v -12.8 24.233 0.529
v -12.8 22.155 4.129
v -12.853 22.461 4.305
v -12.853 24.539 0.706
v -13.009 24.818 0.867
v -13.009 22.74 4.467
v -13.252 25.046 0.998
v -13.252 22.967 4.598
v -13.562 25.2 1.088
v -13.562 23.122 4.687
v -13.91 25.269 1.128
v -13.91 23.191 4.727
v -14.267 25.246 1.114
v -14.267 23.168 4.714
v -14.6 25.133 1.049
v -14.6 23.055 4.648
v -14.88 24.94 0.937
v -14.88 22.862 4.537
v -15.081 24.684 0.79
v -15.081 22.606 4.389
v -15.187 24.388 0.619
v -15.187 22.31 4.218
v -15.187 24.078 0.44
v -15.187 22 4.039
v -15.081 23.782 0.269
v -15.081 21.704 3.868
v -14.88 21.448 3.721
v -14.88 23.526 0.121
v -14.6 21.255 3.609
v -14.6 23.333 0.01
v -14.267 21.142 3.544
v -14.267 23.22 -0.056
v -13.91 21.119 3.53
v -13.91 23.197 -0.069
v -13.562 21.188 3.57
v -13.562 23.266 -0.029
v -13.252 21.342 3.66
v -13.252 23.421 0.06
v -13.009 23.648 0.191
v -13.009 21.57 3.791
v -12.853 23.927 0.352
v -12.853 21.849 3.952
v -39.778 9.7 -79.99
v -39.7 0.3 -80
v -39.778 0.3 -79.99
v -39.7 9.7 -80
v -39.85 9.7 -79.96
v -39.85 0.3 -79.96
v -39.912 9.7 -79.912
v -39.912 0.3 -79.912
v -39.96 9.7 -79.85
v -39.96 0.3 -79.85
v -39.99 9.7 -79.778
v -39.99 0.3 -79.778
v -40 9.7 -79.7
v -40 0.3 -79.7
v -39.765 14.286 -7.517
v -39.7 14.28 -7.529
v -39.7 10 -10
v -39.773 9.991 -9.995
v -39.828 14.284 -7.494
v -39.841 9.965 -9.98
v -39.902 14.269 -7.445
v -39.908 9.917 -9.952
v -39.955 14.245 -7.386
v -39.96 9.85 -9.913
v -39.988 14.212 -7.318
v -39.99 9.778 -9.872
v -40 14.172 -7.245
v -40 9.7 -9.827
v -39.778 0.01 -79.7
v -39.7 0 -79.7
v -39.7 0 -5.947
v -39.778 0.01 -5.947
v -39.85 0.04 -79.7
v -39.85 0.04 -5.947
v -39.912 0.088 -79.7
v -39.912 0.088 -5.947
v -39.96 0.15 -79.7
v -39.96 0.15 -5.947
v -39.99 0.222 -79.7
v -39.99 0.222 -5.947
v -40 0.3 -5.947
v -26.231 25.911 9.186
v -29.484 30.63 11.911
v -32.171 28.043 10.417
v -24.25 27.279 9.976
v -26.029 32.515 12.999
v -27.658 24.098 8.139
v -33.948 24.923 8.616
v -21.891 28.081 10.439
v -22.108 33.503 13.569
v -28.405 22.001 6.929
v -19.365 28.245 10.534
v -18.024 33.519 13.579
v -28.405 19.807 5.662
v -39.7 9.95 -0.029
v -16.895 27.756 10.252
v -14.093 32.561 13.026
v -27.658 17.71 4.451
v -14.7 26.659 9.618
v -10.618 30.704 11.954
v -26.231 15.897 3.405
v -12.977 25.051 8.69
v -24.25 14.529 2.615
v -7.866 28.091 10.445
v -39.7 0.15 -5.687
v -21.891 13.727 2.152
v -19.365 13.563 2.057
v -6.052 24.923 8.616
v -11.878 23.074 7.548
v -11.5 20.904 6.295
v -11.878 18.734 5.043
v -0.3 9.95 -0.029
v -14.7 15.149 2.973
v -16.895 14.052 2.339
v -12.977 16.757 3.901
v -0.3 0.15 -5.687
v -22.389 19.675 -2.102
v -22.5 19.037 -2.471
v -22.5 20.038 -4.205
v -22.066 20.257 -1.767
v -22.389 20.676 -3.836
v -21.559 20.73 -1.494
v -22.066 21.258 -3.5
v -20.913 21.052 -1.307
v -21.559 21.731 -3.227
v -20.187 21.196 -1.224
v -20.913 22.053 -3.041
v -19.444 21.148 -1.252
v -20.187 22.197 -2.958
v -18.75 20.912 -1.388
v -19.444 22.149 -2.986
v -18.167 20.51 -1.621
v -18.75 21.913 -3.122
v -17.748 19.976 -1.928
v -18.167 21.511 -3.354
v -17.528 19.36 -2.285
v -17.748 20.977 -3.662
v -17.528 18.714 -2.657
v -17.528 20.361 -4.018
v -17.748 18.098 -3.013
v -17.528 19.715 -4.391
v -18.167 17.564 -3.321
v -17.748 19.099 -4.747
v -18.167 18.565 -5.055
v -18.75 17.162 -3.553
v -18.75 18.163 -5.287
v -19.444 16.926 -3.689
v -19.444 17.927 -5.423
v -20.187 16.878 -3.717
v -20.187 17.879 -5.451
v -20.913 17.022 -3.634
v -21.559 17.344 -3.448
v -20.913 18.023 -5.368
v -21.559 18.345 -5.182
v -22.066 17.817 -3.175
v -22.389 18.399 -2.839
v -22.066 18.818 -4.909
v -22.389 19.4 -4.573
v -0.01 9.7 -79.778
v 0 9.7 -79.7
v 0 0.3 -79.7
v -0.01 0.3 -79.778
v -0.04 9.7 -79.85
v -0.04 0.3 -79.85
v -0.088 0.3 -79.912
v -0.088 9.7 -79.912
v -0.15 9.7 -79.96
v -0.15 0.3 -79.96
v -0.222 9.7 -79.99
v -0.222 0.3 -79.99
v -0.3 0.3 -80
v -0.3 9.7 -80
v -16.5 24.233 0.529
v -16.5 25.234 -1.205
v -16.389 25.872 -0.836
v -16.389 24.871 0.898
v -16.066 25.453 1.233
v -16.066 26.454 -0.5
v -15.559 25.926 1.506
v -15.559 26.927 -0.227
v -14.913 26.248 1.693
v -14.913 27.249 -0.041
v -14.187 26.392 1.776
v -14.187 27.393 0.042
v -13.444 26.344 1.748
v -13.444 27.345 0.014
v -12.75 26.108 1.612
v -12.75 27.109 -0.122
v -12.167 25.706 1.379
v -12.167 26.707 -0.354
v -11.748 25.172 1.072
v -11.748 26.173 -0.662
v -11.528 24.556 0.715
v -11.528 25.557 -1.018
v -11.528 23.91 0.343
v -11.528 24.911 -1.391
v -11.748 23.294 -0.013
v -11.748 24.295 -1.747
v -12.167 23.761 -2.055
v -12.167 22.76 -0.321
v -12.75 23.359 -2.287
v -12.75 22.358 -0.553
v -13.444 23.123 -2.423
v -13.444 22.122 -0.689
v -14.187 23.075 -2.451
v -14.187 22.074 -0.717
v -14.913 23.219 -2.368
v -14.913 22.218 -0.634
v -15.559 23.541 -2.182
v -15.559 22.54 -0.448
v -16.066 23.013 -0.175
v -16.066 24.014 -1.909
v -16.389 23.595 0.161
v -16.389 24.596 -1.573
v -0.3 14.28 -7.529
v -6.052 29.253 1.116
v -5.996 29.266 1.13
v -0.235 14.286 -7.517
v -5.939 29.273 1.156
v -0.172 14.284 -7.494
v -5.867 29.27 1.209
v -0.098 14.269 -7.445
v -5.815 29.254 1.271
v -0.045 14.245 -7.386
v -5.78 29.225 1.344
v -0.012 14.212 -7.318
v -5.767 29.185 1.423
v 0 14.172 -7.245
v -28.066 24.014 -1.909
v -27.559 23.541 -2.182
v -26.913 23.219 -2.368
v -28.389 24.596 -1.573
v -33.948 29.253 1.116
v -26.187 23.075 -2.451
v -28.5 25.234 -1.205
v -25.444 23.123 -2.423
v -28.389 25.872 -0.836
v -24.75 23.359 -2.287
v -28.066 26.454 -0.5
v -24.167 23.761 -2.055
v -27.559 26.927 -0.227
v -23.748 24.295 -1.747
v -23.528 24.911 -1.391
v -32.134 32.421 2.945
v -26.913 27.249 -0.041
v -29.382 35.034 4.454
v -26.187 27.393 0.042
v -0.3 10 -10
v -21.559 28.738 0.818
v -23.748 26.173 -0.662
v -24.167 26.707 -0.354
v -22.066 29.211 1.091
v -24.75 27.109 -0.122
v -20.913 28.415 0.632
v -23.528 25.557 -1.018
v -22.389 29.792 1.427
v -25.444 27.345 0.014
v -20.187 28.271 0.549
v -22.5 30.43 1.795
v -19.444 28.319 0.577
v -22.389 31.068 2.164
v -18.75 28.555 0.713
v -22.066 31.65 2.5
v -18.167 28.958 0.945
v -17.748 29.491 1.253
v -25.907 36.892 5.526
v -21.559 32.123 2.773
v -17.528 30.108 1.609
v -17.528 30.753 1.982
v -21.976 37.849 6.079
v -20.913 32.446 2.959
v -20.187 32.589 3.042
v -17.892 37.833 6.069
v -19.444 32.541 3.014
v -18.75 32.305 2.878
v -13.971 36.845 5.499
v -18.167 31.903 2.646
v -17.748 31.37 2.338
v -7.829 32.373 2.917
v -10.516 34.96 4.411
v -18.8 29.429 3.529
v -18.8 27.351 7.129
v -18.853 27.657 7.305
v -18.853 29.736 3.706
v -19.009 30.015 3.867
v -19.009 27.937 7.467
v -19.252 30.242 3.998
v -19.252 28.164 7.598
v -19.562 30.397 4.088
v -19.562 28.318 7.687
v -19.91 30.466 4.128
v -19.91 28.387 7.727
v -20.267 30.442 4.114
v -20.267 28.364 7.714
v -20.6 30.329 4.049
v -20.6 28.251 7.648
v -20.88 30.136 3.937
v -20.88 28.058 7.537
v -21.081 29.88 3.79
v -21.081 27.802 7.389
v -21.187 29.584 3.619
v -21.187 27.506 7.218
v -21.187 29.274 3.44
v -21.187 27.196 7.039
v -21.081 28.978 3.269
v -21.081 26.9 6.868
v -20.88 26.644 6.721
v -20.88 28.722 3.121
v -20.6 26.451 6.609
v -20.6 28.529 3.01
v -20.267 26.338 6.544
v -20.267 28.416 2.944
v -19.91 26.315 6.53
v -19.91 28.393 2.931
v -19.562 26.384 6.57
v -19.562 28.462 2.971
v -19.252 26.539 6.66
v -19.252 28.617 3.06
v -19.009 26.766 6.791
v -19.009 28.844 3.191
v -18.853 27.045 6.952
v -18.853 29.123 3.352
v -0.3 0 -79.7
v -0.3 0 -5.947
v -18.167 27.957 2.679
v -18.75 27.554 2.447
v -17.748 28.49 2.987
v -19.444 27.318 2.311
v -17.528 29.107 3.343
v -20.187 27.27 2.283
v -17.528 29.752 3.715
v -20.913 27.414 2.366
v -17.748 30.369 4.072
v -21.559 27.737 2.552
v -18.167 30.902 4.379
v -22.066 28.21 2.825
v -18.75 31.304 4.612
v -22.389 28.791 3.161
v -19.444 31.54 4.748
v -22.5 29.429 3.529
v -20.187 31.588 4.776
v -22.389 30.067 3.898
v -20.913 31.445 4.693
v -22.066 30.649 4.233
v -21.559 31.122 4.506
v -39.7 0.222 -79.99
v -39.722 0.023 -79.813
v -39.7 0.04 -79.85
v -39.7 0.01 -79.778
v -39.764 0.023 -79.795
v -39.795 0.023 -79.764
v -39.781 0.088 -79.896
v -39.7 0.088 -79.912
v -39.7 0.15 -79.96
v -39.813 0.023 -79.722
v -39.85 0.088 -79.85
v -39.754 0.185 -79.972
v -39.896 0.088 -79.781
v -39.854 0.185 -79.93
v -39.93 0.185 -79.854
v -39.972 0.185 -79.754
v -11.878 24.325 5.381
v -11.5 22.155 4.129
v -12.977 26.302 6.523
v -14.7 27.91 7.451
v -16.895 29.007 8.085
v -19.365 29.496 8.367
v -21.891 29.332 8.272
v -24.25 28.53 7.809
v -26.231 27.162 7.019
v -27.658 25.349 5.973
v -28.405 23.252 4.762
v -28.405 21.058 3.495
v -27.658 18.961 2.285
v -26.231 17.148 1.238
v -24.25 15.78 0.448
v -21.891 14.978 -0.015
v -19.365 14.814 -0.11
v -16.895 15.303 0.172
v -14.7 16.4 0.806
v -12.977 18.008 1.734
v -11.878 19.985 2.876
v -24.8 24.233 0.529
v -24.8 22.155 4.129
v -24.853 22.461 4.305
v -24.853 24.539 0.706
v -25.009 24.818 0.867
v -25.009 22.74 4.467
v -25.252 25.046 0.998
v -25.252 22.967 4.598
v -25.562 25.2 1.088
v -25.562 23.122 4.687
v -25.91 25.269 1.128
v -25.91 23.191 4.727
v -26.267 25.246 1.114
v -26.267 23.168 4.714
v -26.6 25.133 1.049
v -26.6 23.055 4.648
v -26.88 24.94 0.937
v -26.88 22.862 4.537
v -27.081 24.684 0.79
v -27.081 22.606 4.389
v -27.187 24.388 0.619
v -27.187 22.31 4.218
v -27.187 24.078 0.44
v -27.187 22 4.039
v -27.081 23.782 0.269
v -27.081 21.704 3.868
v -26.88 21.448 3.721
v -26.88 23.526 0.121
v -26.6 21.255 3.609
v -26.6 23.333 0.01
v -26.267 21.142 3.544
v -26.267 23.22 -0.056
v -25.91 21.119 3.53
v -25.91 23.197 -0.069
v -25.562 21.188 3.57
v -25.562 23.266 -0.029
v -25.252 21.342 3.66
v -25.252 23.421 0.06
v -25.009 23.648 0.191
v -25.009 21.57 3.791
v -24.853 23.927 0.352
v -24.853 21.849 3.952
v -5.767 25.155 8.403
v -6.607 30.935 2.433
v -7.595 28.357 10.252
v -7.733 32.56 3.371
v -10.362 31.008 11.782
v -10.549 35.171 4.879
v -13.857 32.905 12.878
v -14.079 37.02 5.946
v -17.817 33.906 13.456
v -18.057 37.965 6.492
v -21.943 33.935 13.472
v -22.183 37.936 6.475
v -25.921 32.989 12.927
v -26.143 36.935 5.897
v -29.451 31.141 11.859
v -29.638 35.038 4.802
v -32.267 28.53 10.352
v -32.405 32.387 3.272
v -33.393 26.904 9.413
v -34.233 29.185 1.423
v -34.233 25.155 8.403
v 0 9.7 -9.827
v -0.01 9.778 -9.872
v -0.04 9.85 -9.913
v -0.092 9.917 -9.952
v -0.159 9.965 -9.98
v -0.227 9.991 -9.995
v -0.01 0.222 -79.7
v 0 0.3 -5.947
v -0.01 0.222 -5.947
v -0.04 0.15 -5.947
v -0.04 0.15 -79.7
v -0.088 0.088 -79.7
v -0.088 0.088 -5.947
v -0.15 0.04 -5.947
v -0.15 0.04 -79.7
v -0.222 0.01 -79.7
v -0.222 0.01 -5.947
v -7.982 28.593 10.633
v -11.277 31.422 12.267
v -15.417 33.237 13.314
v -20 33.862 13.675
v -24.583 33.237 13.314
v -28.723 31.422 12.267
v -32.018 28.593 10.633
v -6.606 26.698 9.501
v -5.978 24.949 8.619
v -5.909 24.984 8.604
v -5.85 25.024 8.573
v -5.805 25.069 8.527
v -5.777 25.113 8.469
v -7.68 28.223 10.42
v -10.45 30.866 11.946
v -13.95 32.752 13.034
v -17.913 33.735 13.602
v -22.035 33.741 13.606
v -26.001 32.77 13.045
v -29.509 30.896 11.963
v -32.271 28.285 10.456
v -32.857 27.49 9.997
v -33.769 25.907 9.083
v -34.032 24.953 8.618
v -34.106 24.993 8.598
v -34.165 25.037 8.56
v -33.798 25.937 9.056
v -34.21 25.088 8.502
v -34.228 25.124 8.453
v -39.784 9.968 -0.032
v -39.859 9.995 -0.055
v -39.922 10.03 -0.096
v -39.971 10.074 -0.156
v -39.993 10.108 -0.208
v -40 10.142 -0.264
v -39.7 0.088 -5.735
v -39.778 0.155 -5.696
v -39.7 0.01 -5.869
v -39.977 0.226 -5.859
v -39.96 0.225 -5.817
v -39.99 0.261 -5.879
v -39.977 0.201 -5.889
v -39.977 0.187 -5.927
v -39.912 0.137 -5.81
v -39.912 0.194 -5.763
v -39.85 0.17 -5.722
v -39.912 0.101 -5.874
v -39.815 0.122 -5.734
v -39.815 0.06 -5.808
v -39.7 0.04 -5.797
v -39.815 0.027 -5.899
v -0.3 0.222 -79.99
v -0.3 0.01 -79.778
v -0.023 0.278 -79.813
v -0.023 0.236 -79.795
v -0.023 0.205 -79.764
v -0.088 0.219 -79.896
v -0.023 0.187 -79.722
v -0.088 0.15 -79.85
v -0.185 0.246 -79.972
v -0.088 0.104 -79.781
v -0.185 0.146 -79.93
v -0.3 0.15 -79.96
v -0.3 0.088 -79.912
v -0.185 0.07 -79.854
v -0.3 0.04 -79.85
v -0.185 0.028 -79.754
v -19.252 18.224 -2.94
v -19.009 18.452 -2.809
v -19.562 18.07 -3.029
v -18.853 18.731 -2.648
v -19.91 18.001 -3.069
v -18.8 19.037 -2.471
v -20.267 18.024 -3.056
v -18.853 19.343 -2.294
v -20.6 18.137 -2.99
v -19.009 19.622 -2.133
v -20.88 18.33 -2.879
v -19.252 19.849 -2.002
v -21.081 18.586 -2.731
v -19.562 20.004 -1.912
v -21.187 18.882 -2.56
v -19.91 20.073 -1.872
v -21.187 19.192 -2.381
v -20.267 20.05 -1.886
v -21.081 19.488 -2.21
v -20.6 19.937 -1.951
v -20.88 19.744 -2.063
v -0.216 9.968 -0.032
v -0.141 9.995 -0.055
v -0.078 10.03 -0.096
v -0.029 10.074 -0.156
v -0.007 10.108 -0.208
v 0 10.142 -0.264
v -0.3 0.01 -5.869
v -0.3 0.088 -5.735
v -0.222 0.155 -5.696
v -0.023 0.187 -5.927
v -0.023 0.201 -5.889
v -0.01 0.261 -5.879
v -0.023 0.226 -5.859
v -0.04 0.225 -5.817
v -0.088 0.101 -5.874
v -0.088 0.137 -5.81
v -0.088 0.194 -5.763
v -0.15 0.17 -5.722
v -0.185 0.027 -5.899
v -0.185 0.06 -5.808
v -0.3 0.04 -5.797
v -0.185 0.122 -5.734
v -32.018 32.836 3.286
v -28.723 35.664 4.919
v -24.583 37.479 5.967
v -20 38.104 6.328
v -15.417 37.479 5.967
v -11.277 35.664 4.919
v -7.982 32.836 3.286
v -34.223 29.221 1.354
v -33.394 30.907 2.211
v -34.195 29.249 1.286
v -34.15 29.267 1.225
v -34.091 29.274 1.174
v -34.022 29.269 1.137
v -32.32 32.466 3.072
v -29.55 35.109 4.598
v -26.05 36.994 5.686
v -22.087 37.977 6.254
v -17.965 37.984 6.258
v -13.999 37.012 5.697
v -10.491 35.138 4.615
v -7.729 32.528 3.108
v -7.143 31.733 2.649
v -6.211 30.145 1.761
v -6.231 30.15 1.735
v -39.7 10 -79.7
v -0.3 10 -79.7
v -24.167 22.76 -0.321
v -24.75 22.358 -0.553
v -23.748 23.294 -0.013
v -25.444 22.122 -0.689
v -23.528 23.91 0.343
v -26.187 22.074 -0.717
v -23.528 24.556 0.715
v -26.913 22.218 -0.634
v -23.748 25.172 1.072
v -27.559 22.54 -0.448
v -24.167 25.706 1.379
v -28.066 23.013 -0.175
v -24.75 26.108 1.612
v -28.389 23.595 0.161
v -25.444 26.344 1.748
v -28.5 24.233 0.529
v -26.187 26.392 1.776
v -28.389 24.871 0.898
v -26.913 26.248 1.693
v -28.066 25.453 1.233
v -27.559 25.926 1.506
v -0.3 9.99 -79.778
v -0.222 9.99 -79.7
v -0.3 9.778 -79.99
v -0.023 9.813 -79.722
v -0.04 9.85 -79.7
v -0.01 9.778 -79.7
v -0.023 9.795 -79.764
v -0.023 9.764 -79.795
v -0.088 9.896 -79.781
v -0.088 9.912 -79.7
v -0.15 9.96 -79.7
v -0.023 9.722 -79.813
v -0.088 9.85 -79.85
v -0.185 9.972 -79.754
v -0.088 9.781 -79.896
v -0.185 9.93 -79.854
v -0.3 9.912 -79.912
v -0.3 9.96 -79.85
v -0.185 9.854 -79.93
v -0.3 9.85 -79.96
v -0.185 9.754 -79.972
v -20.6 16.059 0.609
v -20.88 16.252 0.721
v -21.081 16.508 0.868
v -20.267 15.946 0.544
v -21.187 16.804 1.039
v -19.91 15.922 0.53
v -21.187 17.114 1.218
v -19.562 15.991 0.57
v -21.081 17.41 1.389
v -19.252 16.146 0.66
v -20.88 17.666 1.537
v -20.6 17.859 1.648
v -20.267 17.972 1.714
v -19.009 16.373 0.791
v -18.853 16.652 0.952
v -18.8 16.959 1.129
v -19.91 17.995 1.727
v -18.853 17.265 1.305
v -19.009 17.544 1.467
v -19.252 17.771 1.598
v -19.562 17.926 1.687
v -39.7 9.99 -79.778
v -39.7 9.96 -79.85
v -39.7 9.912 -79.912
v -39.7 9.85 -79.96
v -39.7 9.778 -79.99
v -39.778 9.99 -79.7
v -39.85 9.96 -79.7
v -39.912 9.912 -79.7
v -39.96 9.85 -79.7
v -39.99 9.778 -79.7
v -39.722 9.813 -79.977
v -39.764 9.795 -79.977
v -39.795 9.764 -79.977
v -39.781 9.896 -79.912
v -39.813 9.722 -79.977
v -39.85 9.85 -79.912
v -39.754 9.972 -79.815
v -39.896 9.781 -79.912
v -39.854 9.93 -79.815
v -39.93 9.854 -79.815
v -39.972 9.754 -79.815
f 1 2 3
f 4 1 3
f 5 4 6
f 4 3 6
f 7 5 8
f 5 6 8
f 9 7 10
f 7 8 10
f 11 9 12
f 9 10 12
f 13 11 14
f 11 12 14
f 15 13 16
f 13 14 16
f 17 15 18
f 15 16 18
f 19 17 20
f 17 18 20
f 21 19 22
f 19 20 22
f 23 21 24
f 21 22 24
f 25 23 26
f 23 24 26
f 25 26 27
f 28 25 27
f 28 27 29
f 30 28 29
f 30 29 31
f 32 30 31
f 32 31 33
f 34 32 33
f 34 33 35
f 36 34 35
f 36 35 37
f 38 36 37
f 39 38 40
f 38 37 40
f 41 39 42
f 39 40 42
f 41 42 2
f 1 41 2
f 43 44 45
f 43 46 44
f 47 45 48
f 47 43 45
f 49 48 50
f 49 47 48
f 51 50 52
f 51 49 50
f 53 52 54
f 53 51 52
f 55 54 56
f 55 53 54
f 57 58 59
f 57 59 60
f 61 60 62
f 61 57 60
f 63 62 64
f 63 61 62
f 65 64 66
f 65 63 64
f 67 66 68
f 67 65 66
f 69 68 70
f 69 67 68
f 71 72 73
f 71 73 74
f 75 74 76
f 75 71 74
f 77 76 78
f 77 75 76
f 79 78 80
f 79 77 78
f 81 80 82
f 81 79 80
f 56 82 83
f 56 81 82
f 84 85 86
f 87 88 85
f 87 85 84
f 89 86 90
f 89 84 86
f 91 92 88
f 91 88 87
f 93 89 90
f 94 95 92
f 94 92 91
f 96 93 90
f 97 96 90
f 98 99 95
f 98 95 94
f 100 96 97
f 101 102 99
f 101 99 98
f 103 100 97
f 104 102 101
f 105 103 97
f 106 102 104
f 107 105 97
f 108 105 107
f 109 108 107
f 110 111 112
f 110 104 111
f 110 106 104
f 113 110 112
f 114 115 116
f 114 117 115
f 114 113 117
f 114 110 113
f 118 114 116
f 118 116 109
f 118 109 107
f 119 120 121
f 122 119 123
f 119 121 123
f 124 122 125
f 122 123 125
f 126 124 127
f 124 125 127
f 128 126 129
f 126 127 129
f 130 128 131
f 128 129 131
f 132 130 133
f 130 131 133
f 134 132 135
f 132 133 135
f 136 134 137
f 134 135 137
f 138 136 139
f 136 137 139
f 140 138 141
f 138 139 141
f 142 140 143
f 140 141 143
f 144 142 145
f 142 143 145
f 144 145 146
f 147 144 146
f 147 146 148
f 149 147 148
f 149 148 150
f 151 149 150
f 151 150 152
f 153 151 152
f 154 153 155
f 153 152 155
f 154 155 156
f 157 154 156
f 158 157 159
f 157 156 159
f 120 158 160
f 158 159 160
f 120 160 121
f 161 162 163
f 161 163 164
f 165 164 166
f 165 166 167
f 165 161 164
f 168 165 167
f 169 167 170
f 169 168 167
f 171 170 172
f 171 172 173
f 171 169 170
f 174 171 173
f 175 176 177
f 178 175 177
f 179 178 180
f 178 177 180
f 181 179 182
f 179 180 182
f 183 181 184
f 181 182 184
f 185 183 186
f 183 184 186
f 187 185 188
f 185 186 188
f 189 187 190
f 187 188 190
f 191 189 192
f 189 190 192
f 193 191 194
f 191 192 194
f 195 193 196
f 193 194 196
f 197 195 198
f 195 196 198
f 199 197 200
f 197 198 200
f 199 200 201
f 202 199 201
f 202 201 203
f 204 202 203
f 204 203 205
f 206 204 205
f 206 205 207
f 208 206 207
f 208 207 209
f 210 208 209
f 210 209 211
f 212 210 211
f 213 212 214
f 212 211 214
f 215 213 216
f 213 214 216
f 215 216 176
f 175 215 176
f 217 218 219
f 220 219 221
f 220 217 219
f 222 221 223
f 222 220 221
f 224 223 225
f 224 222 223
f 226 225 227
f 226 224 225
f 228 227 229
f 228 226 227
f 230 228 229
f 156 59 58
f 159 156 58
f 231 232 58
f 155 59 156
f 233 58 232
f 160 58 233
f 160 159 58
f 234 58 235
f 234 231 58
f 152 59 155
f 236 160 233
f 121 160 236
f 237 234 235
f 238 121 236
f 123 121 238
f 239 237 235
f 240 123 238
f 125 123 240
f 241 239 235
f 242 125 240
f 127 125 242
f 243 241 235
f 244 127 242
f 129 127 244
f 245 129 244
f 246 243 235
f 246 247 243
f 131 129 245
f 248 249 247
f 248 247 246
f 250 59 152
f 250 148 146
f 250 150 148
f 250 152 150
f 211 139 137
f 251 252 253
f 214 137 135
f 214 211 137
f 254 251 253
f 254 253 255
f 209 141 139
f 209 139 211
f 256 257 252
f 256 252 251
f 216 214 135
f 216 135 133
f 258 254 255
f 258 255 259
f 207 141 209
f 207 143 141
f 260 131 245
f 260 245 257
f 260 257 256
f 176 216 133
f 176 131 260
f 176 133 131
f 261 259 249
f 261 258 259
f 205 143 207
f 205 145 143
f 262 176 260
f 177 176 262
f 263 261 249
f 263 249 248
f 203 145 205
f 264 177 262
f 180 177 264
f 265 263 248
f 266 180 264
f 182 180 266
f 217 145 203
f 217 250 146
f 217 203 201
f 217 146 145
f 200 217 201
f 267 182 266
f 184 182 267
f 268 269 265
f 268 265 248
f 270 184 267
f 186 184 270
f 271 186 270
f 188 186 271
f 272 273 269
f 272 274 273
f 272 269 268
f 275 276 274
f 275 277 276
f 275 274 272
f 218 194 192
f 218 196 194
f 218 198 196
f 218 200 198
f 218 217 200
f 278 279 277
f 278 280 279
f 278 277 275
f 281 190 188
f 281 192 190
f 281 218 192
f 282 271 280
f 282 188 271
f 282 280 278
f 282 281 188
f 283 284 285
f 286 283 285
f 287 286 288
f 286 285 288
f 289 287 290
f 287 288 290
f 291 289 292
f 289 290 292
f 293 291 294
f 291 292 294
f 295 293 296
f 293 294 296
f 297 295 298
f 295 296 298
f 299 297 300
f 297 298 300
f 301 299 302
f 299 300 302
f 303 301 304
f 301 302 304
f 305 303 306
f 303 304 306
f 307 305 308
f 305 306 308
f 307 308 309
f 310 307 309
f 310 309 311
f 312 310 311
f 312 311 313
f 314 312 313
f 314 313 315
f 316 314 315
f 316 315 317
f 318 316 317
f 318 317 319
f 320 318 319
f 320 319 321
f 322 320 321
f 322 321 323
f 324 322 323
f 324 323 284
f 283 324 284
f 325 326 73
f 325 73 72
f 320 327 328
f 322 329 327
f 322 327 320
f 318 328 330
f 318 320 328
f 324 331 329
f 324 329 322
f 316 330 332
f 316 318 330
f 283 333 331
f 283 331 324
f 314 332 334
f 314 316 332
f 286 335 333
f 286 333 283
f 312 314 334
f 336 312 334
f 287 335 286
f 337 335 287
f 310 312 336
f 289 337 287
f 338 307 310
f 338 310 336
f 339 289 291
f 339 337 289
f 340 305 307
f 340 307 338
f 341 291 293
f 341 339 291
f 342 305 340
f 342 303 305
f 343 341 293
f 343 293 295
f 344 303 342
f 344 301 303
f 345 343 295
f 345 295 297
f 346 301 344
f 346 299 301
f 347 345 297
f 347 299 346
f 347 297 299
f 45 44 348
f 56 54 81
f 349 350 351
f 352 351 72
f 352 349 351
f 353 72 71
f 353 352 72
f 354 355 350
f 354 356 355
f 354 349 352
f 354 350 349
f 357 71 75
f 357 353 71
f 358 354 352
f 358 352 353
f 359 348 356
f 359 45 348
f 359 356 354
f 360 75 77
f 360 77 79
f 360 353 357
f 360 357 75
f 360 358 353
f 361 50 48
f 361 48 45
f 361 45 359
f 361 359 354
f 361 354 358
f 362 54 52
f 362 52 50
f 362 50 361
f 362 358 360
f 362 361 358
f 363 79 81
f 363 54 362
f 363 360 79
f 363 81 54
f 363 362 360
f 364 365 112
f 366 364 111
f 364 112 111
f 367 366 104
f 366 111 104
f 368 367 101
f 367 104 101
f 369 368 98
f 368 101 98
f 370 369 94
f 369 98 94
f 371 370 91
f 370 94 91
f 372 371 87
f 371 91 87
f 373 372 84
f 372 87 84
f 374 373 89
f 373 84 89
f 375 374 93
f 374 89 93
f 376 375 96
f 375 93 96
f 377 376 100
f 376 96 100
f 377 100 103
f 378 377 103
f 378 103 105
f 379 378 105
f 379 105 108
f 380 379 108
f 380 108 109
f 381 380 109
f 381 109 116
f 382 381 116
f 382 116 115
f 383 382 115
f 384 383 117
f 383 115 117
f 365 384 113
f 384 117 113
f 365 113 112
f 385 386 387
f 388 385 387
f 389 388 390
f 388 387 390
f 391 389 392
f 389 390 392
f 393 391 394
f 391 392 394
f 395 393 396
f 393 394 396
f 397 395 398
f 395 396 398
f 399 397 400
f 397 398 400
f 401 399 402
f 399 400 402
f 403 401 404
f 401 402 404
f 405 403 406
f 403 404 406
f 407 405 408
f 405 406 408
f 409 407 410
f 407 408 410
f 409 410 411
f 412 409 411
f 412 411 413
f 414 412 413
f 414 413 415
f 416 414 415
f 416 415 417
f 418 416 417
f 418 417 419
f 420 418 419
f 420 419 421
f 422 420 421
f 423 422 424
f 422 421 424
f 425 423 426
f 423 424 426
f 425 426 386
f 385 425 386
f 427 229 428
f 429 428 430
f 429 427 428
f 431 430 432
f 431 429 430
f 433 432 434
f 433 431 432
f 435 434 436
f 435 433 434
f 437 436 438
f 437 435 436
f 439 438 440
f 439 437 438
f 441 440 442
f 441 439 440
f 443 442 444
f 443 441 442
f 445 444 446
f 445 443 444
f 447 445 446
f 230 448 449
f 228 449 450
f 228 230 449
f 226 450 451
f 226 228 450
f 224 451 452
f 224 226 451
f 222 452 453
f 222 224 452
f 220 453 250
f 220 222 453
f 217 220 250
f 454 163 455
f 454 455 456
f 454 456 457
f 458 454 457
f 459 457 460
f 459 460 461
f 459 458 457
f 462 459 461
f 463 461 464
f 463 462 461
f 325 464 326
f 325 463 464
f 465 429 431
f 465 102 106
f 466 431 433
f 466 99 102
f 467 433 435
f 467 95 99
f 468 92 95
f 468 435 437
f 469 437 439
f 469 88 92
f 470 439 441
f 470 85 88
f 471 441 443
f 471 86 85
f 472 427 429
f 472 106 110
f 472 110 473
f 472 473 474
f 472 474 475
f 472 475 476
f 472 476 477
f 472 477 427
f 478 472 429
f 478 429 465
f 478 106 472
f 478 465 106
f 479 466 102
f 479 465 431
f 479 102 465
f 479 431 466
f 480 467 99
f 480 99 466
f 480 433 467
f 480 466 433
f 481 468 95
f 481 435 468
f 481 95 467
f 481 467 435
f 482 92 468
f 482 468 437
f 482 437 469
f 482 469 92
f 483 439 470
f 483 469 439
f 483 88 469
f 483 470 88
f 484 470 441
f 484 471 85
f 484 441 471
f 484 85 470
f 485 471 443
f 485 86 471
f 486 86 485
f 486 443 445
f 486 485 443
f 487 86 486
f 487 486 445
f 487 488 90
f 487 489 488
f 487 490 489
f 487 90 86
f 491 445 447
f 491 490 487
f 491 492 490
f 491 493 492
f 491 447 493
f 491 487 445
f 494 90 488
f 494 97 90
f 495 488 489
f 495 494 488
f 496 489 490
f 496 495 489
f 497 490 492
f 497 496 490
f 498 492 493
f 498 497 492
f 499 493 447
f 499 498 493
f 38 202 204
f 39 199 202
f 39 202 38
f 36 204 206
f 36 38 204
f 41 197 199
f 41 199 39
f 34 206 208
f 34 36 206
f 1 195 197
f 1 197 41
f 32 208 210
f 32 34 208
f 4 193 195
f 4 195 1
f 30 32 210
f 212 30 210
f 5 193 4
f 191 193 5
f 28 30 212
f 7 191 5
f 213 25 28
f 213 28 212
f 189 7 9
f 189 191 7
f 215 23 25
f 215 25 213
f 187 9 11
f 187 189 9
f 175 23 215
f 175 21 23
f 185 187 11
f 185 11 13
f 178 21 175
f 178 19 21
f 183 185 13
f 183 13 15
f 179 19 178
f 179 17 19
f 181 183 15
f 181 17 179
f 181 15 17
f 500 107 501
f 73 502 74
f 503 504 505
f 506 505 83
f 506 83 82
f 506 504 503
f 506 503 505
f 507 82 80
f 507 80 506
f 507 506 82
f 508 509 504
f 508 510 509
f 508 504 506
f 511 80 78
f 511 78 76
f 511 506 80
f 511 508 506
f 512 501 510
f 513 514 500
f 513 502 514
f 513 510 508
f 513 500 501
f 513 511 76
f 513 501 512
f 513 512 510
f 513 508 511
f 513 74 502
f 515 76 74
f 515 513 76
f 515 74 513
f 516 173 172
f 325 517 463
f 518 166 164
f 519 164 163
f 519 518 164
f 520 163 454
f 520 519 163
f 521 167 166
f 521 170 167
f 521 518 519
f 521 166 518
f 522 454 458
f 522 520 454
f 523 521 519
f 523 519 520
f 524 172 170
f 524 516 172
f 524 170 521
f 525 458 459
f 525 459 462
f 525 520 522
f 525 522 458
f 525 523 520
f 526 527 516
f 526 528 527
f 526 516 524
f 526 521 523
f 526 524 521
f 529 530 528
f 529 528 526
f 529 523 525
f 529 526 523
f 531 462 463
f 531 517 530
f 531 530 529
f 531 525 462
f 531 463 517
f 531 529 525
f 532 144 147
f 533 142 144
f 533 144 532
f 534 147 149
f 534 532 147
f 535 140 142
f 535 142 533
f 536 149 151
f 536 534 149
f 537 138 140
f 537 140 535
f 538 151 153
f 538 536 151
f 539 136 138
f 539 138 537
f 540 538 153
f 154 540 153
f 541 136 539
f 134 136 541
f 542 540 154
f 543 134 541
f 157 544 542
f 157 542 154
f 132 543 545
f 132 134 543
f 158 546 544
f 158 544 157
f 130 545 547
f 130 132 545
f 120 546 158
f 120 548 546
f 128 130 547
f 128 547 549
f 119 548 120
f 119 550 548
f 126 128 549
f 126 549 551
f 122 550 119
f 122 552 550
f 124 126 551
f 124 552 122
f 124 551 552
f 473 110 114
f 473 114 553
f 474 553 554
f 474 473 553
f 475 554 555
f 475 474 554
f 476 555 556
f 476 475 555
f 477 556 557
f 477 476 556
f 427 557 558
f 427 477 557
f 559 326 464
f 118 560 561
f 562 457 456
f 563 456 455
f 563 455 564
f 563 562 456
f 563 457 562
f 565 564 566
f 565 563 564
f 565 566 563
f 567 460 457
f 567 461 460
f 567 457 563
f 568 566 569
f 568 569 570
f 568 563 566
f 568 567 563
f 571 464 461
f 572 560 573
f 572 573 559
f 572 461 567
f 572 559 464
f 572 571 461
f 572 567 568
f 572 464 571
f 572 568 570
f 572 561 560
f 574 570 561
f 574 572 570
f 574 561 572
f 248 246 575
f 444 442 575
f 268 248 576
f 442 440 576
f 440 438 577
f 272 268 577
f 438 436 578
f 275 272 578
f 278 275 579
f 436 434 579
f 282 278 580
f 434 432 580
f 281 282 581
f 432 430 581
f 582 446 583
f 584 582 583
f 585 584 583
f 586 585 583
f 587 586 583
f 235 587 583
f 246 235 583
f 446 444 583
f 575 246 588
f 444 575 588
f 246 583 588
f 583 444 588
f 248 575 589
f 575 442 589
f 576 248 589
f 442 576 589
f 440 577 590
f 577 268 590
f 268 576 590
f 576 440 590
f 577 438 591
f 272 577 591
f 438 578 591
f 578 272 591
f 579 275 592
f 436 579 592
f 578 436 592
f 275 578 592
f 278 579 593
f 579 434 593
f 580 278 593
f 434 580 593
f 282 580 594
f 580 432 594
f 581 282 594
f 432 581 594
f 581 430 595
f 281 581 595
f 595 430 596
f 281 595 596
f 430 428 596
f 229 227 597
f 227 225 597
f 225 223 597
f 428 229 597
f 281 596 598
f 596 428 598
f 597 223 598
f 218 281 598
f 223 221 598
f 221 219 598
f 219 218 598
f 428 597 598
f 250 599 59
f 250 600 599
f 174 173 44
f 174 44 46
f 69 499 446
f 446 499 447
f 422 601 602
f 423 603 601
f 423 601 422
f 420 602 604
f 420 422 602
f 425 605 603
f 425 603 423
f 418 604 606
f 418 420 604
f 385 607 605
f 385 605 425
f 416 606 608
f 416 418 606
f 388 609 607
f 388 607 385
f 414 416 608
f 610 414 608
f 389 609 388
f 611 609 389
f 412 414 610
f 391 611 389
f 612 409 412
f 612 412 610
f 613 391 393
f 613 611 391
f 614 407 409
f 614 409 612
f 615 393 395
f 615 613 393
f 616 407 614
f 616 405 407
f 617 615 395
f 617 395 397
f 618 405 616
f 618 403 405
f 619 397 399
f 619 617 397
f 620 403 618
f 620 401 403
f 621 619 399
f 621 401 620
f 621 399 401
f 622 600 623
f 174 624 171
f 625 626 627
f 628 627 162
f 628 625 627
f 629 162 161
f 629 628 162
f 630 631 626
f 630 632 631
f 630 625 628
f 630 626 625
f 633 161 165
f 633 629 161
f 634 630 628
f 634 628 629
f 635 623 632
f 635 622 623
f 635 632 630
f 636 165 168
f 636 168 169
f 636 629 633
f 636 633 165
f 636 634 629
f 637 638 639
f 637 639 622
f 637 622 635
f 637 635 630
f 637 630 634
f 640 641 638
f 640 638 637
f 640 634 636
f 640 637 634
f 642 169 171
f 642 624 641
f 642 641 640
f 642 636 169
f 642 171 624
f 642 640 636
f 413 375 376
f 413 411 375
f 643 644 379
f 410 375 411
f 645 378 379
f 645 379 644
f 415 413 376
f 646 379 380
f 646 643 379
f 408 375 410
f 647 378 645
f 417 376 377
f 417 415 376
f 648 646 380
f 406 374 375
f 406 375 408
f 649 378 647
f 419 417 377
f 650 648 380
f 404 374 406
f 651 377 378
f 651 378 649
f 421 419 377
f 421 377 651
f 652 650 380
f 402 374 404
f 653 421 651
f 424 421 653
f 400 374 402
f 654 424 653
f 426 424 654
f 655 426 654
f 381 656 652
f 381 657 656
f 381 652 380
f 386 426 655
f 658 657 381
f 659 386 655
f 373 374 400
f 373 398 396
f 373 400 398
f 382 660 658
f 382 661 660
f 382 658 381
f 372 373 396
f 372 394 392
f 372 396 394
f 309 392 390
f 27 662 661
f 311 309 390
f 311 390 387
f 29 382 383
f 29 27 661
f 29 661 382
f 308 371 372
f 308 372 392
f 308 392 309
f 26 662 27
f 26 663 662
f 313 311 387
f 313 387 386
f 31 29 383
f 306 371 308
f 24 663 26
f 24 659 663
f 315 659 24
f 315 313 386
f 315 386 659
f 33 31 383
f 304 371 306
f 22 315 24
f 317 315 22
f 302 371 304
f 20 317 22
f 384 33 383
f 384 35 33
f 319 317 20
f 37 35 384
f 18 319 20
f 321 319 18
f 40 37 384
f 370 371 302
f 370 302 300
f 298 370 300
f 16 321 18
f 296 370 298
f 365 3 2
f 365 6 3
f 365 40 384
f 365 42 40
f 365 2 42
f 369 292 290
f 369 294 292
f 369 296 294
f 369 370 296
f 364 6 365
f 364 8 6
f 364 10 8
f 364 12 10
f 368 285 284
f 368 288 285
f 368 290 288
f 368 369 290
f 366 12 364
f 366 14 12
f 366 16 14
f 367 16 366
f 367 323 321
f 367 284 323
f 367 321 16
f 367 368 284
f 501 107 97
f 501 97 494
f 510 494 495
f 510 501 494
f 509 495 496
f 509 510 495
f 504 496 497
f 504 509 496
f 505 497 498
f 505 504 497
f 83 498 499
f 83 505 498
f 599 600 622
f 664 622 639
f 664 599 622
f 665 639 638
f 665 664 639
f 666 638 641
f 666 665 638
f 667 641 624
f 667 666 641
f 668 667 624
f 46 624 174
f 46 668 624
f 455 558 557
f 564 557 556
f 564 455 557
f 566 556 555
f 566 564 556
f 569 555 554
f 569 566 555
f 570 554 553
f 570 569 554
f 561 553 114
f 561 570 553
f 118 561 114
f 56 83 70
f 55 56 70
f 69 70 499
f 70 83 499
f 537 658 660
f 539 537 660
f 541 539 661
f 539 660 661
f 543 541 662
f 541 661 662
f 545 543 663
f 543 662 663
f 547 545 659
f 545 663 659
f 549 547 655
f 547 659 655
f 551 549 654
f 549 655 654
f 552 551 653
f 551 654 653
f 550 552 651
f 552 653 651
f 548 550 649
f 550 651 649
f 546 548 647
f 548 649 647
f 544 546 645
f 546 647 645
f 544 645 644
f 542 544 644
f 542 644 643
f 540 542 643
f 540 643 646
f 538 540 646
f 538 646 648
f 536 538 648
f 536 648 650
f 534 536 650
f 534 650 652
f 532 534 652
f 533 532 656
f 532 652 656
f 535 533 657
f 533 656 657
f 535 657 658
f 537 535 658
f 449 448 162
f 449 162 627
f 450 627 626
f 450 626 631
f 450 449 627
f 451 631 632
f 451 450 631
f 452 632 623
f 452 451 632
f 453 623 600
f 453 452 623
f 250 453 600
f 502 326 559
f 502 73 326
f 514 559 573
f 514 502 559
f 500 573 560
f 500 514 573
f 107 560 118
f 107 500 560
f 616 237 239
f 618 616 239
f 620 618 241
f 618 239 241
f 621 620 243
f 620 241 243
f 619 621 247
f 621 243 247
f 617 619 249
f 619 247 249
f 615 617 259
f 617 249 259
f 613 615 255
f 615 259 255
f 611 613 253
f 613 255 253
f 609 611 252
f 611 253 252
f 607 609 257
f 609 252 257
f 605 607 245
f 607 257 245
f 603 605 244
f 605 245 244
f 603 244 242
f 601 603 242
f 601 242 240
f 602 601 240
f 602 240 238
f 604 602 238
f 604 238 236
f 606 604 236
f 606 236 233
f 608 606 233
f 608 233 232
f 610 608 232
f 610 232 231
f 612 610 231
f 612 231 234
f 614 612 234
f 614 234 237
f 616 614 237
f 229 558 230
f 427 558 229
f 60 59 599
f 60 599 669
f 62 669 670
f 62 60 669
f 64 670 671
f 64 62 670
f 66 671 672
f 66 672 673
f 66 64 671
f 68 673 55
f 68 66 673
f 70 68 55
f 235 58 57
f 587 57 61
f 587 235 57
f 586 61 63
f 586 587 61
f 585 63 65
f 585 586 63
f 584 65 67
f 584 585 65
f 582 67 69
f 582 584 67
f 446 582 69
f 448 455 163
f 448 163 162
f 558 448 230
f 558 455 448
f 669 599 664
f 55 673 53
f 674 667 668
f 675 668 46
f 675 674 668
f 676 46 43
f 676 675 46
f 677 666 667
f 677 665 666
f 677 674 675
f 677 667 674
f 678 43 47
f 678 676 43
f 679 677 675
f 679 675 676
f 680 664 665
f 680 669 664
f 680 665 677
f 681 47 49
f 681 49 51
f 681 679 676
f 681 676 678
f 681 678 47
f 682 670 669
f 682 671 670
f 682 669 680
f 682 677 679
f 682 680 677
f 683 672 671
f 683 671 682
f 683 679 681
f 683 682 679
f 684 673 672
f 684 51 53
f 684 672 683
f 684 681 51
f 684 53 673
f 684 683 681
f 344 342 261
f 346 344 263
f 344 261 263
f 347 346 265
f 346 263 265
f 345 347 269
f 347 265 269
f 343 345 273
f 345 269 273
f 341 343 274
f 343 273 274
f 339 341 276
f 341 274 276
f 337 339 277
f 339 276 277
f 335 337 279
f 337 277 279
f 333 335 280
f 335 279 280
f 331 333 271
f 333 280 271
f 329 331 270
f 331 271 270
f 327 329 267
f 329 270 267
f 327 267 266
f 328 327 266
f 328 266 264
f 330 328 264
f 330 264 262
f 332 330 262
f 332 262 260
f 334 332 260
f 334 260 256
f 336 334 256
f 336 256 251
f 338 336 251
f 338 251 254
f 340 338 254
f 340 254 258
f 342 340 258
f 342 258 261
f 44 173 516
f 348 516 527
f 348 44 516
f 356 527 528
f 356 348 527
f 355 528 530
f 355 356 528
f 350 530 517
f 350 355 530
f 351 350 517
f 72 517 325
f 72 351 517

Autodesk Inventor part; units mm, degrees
ref_plane "YZ Plane" through (0, 0, 0) normal (1, 0, 0) x (0, 1, 0)
ref_plane "XZ Plane" through (0, 0, 0) normal (0, 1, 0) x (-1, 0, 0)
sketch "Sketch1" plane through (0, 0, 0) normal (1, 0, 0) x (0, 1, 0)
  line L0 (0, -80) -> (10, -80)
  line L1 (10, -80) -> (10, -10)
  line L2 (10, -10) -> (41.9301, -10)
  line L3 (10, -10) -> (41.9301, 8.4349)
  line L4 (10, -10) -> (36.6272, -10) construction
  line L5 (37.6, 15.9349) -> (0, -5.7735)
  line L6 (37.6, 15.9349) -> (0, 15.9349)
  line L7 (0, 15.9349) -> (0, -80)
  line L8 (37.6, 15.9349) -> (41.9301, 8.4349)
  line L9 (41.9301, 8.4349) -> (41.9301, -10)
  point P0 (0, 0)
  dimension "d4" = 30
extrude "Extrusion1" add sketch "Sketch1" against normal blind 40 contours L7 L5 L8 L3 L1 L0
ref_plane "Work Plane3" through (-40, 0, -5.7735) normal (0, -0.5, 0.866) x (1, 0, 0)
sketch "Sketch3" plane through (-40, 0, -5.7735) normal (0, -0.5, 0.866) x (1, 0, 0)
  line L0 (40, 45.0131) -> (0, 45.0131)
  line L1 (0, 11.5378) -> (40, 11.5378)
  line L2 (0, 11.5378) -> (0, 45.0131)
  line L3 (40, 45.0131) -> (40, 11.5378)
  circle A0 centre (20, 24.1378) radius 15
  circle A1 centre (20, 24.1378) radius 8.5
  line L4 (0, 11.5378) -> (0, 45.0131)
  line L5 (0, 11.5378) -> (5.7669, 28.8728)
  line L6 (40, 11.5378) -> (34.2331, 28.8728)
  circle A2 centre (20, 24.1378) radius 6
  circle A3 centre (20, 30.1378) radius 1.2
  circle A4 centre (26, 24.1378) radius 1.2
  circle A5 centre (20, 18.1378) radius 1.2
  circle A6 centre (14, 24.1378) radius 1.2
  point P0 (40, 2.8868)
  point P1 (20, 39.4287)
  point P2 (11.8612, 11.5378)
  point P3 (28.1388, 11.5378)
  dimension "d19" = 30
  dimension "d20" = 17
  dimension "d21" = 12
  dimension "d22" = 2.4
  dimension "d23" = 2.4
  dimension "d24" = 2.4
  dimension "d25" = 2.4
extrude "Extrusion4" cut sketch "Sketch3" against normal up to surface (8.6603 mm away) contours L3 L6 A0 L5 L2 L0 | A2 A4 | A2 A4 | A3 A2 | A2 A3 | A5 A2 | A2 A5 | A6 A2 | A2 A6
extrude "Extrusion5" cut sketch "Sketch3" against normal blind 2.5 contours A1 | A2 A4 | A2 A4 | A4 A2 A5 A6 A3 | A3 A2 | A2 A3 | A5 A2 | A2 A5 | A6 A2 | A2 A6
sketch "Sketch5" plane through (0, 10, -10) normal (0, 0.5, -0.866) x (-1, 0, 0)
  circle A0 centre (20, 23.5908) radius 1.2 projected
  circle A1 centre (20, 23.5908) radius 2.5
  circle A2 centre (14, 17.5908) radius 1.2 projected
  circle A3 centre (14, 17.5908) radius 2.5
  circle A4 centre (26, 17.5908) radius 1.2 projected
  circle A5 centre (26, 17.5908) radius 2.5
  circle A6 centre (20, 11.5908) radius 1.2 projected
  circle A7 centre (20, 11.5908) radius 2.5
  point P0 (0, -3.6603)
  dimension "d30" = 5
  dimension "d31" = 5
  dimension "d32" = 5
  dimension "d33" = 5
extrude "Extrusion6" cut sketch "Sketch5" against normal blind 2 contours A0 | A1 | A2 | A3 | A4 | A5 | A6 | A7
fillet "Fillet1" radius 0.3 19 edges at (-40, 10, -45) (-40, 12.1611, -8.7523) (-20, 33.8943, 13.7954) (-2.8835, 17.4983, 4.3291) (-37.1165, 17.4983, 4.3291) (-20, 38.2244, 6.2954) (-2.8835, 21.8284, -3.1709) (-37.1165, 21.8284, -3.1709) (-40, 4.996, -2.8891) (-20, 10, -80) (-40, 5, -80) (-40, 0, -42.8868) (-20, 0, -5.7735) (-20, 0, -80) (0, 5, -80) (0, 10, -45) (0, 4.996, -2.8891) (0, 0, -42.8868) (0, 12.1611, -8.7523)
properties part number "rearTorso30Deg"
